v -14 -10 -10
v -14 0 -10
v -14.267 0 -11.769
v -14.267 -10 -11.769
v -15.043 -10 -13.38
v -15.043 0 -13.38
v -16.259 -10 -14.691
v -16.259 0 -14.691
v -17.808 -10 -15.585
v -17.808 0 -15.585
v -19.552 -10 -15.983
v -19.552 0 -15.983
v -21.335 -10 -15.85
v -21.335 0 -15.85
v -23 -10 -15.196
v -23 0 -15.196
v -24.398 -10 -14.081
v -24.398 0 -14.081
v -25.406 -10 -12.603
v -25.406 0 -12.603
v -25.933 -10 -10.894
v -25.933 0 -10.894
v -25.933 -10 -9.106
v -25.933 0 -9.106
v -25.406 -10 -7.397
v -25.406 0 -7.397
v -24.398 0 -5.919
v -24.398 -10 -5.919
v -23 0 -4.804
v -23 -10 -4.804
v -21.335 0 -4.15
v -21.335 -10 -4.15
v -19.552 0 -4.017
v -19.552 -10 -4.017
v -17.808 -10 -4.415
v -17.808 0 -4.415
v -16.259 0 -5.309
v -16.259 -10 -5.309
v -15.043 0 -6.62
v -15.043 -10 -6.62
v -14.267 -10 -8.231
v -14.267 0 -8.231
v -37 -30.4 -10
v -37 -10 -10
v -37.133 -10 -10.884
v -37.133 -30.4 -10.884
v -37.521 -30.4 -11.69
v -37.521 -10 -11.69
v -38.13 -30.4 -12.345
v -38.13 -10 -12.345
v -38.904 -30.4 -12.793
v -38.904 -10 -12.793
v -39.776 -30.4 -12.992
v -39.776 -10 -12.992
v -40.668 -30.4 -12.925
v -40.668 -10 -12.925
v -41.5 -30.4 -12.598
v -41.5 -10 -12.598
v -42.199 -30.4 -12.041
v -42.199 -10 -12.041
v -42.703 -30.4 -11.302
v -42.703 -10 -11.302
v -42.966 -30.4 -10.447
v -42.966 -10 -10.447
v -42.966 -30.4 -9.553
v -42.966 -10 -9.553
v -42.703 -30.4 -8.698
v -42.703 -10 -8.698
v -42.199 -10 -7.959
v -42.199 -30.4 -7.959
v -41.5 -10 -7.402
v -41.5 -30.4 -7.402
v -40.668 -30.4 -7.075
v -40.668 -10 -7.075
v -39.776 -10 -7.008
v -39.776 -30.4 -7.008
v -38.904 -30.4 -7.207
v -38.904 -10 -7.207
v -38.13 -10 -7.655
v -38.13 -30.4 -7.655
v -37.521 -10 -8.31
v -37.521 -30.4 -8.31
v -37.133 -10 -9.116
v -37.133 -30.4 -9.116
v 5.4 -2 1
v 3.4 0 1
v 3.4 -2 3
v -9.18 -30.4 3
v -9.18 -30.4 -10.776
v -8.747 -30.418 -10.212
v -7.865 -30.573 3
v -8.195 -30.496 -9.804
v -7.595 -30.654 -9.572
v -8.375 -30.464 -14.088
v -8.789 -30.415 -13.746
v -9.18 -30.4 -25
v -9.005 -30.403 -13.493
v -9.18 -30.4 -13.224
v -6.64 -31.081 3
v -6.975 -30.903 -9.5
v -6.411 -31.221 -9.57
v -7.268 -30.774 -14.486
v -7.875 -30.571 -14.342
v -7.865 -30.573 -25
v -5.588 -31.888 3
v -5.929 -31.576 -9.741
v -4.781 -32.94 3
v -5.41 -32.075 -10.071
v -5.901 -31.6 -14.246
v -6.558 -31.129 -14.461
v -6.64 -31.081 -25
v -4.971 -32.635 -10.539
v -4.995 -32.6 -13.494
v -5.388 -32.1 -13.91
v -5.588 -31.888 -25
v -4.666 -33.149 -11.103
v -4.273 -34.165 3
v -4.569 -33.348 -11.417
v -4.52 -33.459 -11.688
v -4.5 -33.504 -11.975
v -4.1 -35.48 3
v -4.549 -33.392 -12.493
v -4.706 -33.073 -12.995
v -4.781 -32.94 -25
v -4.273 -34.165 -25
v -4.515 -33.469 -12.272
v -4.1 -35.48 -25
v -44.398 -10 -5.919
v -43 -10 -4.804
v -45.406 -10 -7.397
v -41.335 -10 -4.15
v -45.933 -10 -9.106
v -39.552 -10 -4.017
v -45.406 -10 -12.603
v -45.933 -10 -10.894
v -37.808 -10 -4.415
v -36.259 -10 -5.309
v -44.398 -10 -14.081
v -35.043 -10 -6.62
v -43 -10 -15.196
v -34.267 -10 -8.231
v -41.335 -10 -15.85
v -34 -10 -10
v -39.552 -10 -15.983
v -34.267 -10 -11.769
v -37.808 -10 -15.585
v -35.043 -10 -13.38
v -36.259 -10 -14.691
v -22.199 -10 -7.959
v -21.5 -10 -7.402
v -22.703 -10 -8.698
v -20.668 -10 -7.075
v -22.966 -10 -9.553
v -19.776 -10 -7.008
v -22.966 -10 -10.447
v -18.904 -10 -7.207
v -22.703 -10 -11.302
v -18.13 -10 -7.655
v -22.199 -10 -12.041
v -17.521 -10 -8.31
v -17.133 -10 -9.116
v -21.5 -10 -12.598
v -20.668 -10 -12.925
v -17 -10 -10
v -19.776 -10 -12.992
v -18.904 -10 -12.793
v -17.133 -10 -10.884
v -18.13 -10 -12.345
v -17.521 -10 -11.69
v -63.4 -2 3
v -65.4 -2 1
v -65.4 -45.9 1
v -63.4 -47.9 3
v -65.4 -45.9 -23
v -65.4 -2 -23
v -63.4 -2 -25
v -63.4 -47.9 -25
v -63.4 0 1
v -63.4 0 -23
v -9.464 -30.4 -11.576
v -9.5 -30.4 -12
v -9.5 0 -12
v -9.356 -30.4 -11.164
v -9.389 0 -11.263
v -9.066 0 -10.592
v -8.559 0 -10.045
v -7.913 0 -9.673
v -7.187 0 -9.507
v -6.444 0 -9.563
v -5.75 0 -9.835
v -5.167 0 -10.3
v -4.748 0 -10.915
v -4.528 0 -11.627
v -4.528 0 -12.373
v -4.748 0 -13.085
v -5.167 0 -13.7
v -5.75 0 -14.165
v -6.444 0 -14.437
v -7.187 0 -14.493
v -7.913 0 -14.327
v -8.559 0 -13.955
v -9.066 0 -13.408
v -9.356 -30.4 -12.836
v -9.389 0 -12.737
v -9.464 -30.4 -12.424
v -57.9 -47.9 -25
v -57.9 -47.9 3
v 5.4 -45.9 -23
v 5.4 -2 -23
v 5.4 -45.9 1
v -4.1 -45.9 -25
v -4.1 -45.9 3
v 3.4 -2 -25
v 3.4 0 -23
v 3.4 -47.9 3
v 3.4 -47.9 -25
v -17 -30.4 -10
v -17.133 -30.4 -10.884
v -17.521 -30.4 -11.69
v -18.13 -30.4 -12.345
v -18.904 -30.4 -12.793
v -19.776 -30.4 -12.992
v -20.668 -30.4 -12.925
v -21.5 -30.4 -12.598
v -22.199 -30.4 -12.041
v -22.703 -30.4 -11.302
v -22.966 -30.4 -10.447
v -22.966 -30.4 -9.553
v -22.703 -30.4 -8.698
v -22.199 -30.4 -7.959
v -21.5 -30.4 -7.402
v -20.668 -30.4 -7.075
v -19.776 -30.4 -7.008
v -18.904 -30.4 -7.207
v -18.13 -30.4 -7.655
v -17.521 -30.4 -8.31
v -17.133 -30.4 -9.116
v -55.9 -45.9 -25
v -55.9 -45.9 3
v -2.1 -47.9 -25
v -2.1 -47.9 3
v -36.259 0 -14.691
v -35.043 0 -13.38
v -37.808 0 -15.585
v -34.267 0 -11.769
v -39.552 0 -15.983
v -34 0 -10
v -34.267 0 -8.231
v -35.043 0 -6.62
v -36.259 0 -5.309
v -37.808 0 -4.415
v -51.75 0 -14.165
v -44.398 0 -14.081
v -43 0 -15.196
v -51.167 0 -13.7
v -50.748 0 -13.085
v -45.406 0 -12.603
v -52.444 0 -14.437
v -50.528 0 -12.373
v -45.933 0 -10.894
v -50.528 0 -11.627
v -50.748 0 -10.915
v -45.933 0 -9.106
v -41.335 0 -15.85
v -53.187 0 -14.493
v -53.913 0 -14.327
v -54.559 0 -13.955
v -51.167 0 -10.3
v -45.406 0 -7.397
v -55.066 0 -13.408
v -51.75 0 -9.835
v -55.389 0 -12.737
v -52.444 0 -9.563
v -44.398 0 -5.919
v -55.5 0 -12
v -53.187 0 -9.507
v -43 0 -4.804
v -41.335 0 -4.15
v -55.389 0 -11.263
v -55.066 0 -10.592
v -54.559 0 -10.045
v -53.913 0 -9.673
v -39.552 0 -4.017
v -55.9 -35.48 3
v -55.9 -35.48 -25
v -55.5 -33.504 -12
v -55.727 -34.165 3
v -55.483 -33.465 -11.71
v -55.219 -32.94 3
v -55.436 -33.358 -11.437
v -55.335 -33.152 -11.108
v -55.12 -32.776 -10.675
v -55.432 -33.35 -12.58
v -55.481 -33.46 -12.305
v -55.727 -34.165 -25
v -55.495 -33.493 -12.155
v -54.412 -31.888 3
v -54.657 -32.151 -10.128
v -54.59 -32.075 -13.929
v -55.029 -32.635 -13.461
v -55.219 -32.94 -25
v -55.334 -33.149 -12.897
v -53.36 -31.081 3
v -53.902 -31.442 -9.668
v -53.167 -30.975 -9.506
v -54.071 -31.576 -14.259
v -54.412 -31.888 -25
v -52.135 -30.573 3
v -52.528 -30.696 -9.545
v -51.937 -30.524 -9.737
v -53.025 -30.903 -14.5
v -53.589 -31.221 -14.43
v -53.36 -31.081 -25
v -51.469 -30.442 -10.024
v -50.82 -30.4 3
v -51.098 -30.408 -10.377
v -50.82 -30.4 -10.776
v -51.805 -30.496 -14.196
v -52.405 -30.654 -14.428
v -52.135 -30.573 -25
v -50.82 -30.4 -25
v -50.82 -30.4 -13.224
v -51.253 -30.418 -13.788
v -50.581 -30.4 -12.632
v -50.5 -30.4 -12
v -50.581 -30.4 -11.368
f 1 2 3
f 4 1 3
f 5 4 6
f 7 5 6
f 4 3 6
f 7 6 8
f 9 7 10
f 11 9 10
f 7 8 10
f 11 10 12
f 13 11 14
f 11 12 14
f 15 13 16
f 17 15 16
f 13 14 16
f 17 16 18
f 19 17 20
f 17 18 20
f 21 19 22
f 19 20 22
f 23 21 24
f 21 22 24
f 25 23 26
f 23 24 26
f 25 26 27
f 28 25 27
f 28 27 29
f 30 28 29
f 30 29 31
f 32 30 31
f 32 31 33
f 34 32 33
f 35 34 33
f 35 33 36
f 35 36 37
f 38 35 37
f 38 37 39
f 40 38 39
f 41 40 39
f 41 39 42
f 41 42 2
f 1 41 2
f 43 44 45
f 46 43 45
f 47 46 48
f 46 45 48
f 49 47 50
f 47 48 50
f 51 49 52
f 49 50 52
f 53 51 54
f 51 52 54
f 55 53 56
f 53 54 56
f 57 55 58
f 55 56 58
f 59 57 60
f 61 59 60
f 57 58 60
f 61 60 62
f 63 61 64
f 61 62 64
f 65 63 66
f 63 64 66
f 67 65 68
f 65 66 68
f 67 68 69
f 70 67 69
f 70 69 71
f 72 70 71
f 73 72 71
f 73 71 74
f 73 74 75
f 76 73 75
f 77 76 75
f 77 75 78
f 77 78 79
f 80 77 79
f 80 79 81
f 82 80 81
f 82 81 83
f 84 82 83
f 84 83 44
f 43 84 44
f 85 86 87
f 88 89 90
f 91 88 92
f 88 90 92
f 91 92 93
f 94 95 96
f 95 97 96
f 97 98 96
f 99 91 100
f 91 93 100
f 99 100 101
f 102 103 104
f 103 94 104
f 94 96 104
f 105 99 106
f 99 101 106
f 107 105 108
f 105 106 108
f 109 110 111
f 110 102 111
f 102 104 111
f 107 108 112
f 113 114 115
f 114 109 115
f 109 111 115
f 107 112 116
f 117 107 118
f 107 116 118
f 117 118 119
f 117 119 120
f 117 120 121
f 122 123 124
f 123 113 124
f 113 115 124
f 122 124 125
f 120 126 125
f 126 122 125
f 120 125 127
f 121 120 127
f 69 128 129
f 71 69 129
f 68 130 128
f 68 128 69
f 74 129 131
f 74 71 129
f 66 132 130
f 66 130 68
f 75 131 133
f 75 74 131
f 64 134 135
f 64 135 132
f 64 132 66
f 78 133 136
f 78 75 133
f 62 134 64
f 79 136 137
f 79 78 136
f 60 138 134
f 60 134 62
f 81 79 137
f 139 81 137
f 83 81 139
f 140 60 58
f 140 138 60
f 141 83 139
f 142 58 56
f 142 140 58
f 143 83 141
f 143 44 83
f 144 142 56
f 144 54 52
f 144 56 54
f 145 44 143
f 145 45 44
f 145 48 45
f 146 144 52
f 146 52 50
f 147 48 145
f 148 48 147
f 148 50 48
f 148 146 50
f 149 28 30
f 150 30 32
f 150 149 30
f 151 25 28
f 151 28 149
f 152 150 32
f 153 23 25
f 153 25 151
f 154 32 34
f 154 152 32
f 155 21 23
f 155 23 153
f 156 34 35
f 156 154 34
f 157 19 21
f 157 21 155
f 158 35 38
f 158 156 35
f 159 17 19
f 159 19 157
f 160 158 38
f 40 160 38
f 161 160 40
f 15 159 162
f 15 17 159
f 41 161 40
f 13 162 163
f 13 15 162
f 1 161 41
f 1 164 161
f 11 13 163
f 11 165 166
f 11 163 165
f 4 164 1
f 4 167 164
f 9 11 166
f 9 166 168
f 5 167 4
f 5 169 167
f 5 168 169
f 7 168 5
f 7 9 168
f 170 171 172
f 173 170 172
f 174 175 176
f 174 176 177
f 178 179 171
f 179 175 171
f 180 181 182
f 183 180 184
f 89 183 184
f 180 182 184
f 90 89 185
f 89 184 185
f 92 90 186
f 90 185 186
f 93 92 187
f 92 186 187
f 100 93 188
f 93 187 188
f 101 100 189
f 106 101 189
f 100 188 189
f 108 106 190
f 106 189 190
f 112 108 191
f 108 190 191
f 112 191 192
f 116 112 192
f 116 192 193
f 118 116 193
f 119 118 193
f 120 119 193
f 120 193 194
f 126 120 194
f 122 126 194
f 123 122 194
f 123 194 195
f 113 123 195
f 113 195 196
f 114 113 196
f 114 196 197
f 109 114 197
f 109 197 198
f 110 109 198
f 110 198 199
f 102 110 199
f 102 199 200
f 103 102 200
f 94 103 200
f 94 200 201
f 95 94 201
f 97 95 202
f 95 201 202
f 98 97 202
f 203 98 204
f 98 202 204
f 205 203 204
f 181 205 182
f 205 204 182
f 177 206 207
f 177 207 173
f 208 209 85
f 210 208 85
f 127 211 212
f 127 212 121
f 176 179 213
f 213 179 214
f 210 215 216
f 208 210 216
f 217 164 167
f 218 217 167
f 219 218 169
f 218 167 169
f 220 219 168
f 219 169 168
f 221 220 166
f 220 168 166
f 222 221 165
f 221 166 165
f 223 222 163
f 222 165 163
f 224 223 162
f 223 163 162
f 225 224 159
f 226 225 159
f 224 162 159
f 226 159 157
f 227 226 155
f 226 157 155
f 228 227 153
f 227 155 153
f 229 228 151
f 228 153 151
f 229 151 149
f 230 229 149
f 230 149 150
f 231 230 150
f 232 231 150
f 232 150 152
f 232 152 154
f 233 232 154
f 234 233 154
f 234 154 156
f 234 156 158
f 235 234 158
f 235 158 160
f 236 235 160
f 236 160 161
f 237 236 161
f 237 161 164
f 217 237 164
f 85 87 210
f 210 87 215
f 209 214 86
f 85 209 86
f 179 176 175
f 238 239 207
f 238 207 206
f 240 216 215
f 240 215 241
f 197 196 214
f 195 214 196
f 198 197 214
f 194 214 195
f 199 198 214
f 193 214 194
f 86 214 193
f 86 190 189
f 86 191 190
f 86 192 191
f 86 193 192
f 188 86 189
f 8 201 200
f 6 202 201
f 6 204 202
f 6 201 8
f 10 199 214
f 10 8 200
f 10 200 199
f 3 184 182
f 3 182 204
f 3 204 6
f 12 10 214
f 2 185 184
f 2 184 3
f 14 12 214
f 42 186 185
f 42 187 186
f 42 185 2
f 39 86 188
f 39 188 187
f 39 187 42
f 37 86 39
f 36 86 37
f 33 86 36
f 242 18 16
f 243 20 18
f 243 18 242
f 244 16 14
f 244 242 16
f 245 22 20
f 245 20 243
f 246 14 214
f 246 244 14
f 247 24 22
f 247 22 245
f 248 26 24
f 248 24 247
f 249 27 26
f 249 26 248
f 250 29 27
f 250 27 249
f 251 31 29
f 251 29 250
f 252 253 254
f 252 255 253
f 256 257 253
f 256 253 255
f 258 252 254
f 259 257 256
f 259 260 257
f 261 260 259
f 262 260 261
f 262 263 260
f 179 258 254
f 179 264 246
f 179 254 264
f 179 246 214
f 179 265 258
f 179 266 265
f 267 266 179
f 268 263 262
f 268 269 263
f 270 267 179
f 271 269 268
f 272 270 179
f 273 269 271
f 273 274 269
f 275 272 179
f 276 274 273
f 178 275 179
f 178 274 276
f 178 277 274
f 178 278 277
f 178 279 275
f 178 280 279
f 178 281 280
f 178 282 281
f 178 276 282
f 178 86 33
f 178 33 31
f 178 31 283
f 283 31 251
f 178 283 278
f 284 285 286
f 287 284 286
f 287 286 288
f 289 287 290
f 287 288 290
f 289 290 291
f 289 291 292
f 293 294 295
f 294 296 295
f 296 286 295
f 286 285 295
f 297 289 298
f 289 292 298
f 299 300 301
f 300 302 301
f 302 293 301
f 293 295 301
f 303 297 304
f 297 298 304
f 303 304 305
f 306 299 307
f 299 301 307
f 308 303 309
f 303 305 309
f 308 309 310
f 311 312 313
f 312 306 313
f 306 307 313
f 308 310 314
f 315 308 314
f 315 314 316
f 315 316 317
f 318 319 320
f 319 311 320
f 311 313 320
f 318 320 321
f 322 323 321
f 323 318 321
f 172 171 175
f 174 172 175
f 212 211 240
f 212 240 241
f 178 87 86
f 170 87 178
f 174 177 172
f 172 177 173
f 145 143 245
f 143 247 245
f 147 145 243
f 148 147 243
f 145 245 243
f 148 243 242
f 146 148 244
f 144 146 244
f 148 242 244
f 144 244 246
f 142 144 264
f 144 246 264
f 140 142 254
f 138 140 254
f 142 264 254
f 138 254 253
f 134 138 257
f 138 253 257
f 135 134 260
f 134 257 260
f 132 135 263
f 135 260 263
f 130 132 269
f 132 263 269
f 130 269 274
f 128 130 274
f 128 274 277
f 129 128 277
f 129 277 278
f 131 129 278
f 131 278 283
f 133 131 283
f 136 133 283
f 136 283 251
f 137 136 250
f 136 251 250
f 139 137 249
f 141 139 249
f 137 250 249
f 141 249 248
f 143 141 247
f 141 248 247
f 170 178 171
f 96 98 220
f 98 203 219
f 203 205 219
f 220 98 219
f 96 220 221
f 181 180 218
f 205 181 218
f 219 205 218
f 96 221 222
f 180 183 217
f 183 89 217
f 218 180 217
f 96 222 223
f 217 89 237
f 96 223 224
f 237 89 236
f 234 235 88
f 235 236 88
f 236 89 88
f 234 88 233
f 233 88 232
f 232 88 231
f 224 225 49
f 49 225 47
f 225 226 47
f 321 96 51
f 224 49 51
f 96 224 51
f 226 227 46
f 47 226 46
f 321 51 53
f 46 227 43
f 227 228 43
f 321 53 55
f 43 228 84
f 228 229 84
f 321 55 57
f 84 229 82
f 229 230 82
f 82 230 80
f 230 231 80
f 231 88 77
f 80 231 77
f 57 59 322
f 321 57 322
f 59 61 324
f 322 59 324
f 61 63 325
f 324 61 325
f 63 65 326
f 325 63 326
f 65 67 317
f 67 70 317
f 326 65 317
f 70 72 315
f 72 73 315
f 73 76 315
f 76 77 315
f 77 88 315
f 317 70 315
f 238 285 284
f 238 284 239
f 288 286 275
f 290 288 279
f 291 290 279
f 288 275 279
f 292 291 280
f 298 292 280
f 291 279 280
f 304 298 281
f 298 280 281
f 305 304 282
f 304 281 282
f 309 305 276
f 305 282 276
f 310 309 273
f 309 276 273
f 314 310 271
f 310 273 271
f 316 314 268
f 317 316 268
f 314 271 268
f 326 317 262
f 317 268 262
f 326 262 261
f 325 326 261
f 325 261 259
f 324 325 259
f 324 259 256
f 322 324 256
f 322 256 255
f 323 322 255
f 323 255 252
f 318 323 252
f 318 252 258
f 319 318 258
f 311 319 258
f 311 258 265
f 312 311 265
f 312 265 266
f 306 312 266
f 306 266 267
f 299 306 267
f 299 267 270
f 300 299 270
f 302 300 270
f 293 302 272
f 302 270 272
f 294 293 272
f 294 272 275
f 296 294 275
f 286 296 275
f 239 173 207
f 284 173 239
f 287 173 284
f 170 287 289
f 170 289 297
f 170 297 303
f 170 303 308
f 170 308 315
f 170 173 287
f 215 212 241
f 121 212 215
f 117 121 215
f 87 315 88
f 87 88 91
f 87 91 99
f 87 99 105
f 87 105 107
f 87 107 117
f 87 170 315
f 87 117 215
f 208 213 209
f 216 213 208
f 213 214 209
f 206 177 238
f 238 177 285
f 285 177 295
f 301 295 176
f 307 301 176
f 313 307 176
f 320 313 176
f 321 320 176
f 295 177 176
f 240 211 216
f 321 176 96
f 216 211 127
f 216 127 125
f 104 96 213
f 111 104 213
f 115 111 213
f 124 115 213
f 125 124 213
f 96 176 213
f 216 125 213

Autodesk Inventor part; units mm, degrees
ref_plane "YZ Plane" through (0, 0, 0) normal (1, 0, 0) x (0, 1, 0)
ref_plane "XZ Plane" through (0, 0, 0) normal (0, 1, 0) x (-1, 0, 0)
sketch "Sketch1" plane through (0, 0, 0) normal (0, 1, 0) x (-1, 0, 0)
  line L0 (0, 0) -> (60, 0) construction
  line L1 (60, 0) -> (60, -20) construction
  line L2 (60, -20) -> (0, -20) construction
  line L3 (0, -20) -> (0, 0) construction
  line L4 (60.5, 0.5) -> (-0.5, 0.5)
  line L5 (-0.5, 0.5) -> (-0.5, -20.5)
  line L6 (-0.5, -20.5) -> (60.5, -20.5)
  line L7 (60.5, -20.5) -> (60.5, 0.5)
  circle A0 centre (53, -12) radius 2.5
  circle A1 centre (7, -12) radius 2.5
  line L8 (53, -12) -> (7, -12) construction
  point P0 (30, -12)
  point P1 (30, -20)
  point P2 (0, -10)
  point P3 (-0.5, -10)
  dimension "d0" = 20
  dimension "d1" = 60
  dimension "d2" = 0.5
  dimension "d3" = 0.5
  dimension "d4" = 0.5
  dimension "d5" = 0.5
  dimension "d6" = 5
  dimension "d7" = 46
  dimension "d109" = 2
sketch "Sketch2" plane through (0, 0, 0) normal (0, 1, 0) x (-1, 0, 0)
  line L0 (-5.4, 5) -> (65.4, 5)
  line L1 (65.4, 5) -> (65.4, -25)
  line L2 (65.4, -25) -> (-5.4, -25)
  line L3 (-5.4, -25) -> (-5.4, 5)
  line L4 (60.5, -20.5) -> (60.5, 0.5) construction
  line L5 (-0.5, 0.5) -> (-0.5, -20.5) construction
  line L6 (-0.5, -20.5) -> (60.5, -20.5) construction
  point P0 (0, 0)
  point P1 (60.5, -10)
  point P2 (65.4, -10)
  point P3 (30, -20.5)
  point P4 (30, -25)
  dimension "d9" = 70.8
  dimension "d10" = 30
  dimension "d44" = 35.4
extrude "Extrusion1" add sketch "Sketch2" against normal blind 30.4
extrude "Extrusion3" cut sketch "Sketch1" against normal blind 43.3375 and the other way blind 30.4 contours A0 | A1
sketch "Sketch3" plane through (5.4, -30.4, -25) normal (0, 0, -1) x (1, 0, 0)
  line L0 (-70.8, 0) -> (0, 0) projected
  line L1 (0, 0) -> (0, 17.5)
  line L2 (0, 17.5) -> (-9.5, 17.5)
  line L3 (-9.5, 17.5) -> (-9.5, 5.08)
  line L4 (-14.58, 0) -> (-56.22, 0)
  line L5 (-61.3, 5.08) -> (-61.3, 17.5)
  line L6 (-61.3, 17.5) -> (-70.8, 17.5)
  line L7 (-70.8, 17.5) -> (-70.8, 0)
  arc A0 (-14.58, 0) -> (-9.5, 5.08) centre (-14.58, 5.08) ccw
  arc A1 (-61.3, 5.08) -> (-56.22, 0) centre (-56.22, 5.08) ccw
  point P0 (-9.5, 0)
  point P1 (-61.3, 0)
  point P2 (-61.3, 11.29)
  point P3 (-9.5, 11.29)
  point P4 (-4.75, 17.5)
  dimension "d94" = 51.8
  dimension "d95" = 17.5
  dimension "d96" = 5.08
extrude "Extrusion4" add sketch "Sketch3" against normal up to surface (30 mm away)
ref_plane "Work Plane3" through (-49.05, -33.575, -1214.2) normal (0, -1, 0) x (1, 0, 0)
sketch "Sketch4" plane through (0, 0, 0) normal (0, 1, 0) x (1, 0, 0)
  line L0 (-60.5, 20.5) -> (0.5, 20.5) construction
  line L1 (-60.5, -0.5) -> (-60.5, 20.5) construction
  circle A0 centre (-40, 10) radius 3
  line L2 (5.4, 25) -> (-65.4, 25) projected
  line L3 (-65.4, 25) -> (-65.4, -5) projected
  circle A1 centre (-20, 10) radius 3
  line L4 (-40, 10) -> (-20, 10) construction
  point P0 (0, 0)
  point P1 (-30, 20.5)
  point P2 (-60.5, 10)
  point P3 (-65.4, 20.5)
  point P4 (5.4, 20.5)
  point P5 (-30, 20.5)
  point P6 (-60.5, 10)
  point P7 (-65.4, 10)
  point P8 (-30, 25)
  point P9 (-30, 10)
  dimension "d82" = 6
  dimension "d98" = 20
  dimension "d107" = 0
extrude "Extrusion5" cut sketch "Sketch4" against normal up to surface (33.575 mm away)
extrude "Extrusion2" cut sketch "Sketch1" against normal blind 43.3375 and the other way blind 5 contours A0 | A1
sketch "Sketch8" plane through (15.4, 40, -25) normal (0, 0, -1) x (1, 0, 0)
  line L0 (25.4, 30) -> (34.4, 30)
  line L1 (34.4, 30) -> (35.4, 31)
  line L2 (35.4, 31) -> (35.4, 34)
  line L3 (35.4, 34) -> (31.95, 37.45)
  line L4 (31.95, 37.45) -> (31.95, 39.8767)
  line L5 (31.95, 39.8767) -> (33.1672, 41.0939)
  arc A0 (34.8792, 42.8058) -> (33.1672, 41.0939) centre (35.1489, 40.8241) ccw
  line L6 (34.8792, 42.8058) -> (35.4, 43.3267)
  line L7 (35.4, 43.3267) -> (35.4, 44.66)
  line L8 (35.4, 44.66) -> (34.8792, 45.1808)
  arc A1 (33.1672, 46.8928) -> (34.8792, 45.1808) centre (35.1489, 47.1626) ccw
  line L9 (33.1672, 46.8928) -> (32.56, 47.5)
  line L10 (32.56, 47.5) -> (25.4, 47.5)
  line L11 (25.4, 47.5) -> (25.4, 30) construction
  line L12 (33.1672, 41.0939) -> (34.8792, 42.8058) construction
  line L13 (33.1672, 46.8928) -> (34.8792, 45.1808) construction
  line L14 (25.4, 30) -> (16.4, 30)
  line L15 (16.4, 30) -> (15.4, 31)
  line L16 (15.4, 31) -> (15.4, 34)
  line L17 (15.4, 34) -> (18.85, 37.45)
  line L18 (18.85, 37.45) -> (18.85, 39.8767)
  line L19 (18.85, 39.8767) -> (17.6328, 41.0939)
  arc A2 (17.6328, 41.0939) -> (15.9208, 42.8058) centre (15.6511, 40.8241) ccw
  line L20 (15.9208, 42.8058) -> (15.4, 43.3267)
  line L21 (15.4, 43.3267) -> (15.4, 44.66)
  line L22 (15.4, 44.66) -> (15.9208, 45.1808)
  arc A3 (15.9208, 45.1808) -> (17.6328, 46.8928) centre (15.6511, 47.1626) ccw
  line L23 (17.6328, 46.8928) -> (18.24, 47.5)
  line L24 (18.24, 47.5) -> (25.4, 47.5)
  line L25 (17.6328, 41.0939) -> (15.9208, 42.8058) construction
  line L26 (17.6328, 46.8928) -> (15.9208, 45.1808) construction
  arc A4 (50.8, 26.825) -> (47.625, 30) centre (47.625, 26.825) ccw construction
  line L27 (34.4, 30) -> (35.4, 30)
  line L28 (3.175, 30) -> (47.625, 30) projected
  line L29 (35.4, 31) -> (35.4, 30)
  line L30 (15.4, 31) -> (15.4, 30)
  line L31 (15.4, 30) -> (16.4, 30)
  point P0 (-15.4, 40)
  point P1 (35.4, 32.5)
  dimension "d64" = 1
  dimension "d65" = 3
  dimension "d66" = 135
  dimension "d67" = 2
  dimension "d69" = 3.45
  dimension "d71" = 17.5
  dimension "d72" = 7.16
  dimension "d73" = 2.375
  dimension "d74" = 1.3333
  dimension "d75" = 2.4211
  dimension "d76" = 15.4
  dimension "d77" = 10
extrude "Extrusion8" [suppressed]
thicken "Thicken1" [suppressed]
sketch "Sketch11" plane through (0, 0, 0) normal (0, 1, 0) x (1, 0, 0)
  circle A0 centre (-20, 10) radius 6
  circle A1 centre (-40, 10) radius 3 projected
  circle A2 centre (-20, 10) radius 3 projected
  circle A3 centre (-40, 10) radius 6
  point P0 (0, 0)
  dimension "d99" = 12
extrude "Extrusion11" cut sketch "Sketch11" against normal blind 10 contours A0 | A1 | A2 | A3
sketch "Sketch12" plane through (-50.82, -30.4, 5) normal (0, 0, 1) x (1, 0, 0)
  line L0 (-31.8767, 47.5596) -> (80.4706, 47.5596)
  line L1 (80.4706, 47.5596) -> (80.4706, -43.9783)
  line L2 (80.4706, -43.9783) -> (-31.8767, -43.9783)
  line L3 (-31.8767, -43.9783) -> (-31.8767, 47.5596)
  point P0 (50.82, 30.4)
extrude "Extrusion12" cut sketch "Sketch12" against normal blind 2
chamfer "Chamfer1" distance 2 angle 45 12 edges at (5.4, 0, -11) (-30, 0, -25) (5.4, -23.95, -25) (-65.4, -23.95, -25) (-55.9, -47.9, -11) (5.4, -47.9, -11) (-65.4, 0, -11) (-65.4, -47.9, -11) (-4.1, -47.9, -11) (-30, 0, 3) (-65.4, -23.95, 3) (5.4, -23.95, 3)
properties part number "BK12_Spacer"
